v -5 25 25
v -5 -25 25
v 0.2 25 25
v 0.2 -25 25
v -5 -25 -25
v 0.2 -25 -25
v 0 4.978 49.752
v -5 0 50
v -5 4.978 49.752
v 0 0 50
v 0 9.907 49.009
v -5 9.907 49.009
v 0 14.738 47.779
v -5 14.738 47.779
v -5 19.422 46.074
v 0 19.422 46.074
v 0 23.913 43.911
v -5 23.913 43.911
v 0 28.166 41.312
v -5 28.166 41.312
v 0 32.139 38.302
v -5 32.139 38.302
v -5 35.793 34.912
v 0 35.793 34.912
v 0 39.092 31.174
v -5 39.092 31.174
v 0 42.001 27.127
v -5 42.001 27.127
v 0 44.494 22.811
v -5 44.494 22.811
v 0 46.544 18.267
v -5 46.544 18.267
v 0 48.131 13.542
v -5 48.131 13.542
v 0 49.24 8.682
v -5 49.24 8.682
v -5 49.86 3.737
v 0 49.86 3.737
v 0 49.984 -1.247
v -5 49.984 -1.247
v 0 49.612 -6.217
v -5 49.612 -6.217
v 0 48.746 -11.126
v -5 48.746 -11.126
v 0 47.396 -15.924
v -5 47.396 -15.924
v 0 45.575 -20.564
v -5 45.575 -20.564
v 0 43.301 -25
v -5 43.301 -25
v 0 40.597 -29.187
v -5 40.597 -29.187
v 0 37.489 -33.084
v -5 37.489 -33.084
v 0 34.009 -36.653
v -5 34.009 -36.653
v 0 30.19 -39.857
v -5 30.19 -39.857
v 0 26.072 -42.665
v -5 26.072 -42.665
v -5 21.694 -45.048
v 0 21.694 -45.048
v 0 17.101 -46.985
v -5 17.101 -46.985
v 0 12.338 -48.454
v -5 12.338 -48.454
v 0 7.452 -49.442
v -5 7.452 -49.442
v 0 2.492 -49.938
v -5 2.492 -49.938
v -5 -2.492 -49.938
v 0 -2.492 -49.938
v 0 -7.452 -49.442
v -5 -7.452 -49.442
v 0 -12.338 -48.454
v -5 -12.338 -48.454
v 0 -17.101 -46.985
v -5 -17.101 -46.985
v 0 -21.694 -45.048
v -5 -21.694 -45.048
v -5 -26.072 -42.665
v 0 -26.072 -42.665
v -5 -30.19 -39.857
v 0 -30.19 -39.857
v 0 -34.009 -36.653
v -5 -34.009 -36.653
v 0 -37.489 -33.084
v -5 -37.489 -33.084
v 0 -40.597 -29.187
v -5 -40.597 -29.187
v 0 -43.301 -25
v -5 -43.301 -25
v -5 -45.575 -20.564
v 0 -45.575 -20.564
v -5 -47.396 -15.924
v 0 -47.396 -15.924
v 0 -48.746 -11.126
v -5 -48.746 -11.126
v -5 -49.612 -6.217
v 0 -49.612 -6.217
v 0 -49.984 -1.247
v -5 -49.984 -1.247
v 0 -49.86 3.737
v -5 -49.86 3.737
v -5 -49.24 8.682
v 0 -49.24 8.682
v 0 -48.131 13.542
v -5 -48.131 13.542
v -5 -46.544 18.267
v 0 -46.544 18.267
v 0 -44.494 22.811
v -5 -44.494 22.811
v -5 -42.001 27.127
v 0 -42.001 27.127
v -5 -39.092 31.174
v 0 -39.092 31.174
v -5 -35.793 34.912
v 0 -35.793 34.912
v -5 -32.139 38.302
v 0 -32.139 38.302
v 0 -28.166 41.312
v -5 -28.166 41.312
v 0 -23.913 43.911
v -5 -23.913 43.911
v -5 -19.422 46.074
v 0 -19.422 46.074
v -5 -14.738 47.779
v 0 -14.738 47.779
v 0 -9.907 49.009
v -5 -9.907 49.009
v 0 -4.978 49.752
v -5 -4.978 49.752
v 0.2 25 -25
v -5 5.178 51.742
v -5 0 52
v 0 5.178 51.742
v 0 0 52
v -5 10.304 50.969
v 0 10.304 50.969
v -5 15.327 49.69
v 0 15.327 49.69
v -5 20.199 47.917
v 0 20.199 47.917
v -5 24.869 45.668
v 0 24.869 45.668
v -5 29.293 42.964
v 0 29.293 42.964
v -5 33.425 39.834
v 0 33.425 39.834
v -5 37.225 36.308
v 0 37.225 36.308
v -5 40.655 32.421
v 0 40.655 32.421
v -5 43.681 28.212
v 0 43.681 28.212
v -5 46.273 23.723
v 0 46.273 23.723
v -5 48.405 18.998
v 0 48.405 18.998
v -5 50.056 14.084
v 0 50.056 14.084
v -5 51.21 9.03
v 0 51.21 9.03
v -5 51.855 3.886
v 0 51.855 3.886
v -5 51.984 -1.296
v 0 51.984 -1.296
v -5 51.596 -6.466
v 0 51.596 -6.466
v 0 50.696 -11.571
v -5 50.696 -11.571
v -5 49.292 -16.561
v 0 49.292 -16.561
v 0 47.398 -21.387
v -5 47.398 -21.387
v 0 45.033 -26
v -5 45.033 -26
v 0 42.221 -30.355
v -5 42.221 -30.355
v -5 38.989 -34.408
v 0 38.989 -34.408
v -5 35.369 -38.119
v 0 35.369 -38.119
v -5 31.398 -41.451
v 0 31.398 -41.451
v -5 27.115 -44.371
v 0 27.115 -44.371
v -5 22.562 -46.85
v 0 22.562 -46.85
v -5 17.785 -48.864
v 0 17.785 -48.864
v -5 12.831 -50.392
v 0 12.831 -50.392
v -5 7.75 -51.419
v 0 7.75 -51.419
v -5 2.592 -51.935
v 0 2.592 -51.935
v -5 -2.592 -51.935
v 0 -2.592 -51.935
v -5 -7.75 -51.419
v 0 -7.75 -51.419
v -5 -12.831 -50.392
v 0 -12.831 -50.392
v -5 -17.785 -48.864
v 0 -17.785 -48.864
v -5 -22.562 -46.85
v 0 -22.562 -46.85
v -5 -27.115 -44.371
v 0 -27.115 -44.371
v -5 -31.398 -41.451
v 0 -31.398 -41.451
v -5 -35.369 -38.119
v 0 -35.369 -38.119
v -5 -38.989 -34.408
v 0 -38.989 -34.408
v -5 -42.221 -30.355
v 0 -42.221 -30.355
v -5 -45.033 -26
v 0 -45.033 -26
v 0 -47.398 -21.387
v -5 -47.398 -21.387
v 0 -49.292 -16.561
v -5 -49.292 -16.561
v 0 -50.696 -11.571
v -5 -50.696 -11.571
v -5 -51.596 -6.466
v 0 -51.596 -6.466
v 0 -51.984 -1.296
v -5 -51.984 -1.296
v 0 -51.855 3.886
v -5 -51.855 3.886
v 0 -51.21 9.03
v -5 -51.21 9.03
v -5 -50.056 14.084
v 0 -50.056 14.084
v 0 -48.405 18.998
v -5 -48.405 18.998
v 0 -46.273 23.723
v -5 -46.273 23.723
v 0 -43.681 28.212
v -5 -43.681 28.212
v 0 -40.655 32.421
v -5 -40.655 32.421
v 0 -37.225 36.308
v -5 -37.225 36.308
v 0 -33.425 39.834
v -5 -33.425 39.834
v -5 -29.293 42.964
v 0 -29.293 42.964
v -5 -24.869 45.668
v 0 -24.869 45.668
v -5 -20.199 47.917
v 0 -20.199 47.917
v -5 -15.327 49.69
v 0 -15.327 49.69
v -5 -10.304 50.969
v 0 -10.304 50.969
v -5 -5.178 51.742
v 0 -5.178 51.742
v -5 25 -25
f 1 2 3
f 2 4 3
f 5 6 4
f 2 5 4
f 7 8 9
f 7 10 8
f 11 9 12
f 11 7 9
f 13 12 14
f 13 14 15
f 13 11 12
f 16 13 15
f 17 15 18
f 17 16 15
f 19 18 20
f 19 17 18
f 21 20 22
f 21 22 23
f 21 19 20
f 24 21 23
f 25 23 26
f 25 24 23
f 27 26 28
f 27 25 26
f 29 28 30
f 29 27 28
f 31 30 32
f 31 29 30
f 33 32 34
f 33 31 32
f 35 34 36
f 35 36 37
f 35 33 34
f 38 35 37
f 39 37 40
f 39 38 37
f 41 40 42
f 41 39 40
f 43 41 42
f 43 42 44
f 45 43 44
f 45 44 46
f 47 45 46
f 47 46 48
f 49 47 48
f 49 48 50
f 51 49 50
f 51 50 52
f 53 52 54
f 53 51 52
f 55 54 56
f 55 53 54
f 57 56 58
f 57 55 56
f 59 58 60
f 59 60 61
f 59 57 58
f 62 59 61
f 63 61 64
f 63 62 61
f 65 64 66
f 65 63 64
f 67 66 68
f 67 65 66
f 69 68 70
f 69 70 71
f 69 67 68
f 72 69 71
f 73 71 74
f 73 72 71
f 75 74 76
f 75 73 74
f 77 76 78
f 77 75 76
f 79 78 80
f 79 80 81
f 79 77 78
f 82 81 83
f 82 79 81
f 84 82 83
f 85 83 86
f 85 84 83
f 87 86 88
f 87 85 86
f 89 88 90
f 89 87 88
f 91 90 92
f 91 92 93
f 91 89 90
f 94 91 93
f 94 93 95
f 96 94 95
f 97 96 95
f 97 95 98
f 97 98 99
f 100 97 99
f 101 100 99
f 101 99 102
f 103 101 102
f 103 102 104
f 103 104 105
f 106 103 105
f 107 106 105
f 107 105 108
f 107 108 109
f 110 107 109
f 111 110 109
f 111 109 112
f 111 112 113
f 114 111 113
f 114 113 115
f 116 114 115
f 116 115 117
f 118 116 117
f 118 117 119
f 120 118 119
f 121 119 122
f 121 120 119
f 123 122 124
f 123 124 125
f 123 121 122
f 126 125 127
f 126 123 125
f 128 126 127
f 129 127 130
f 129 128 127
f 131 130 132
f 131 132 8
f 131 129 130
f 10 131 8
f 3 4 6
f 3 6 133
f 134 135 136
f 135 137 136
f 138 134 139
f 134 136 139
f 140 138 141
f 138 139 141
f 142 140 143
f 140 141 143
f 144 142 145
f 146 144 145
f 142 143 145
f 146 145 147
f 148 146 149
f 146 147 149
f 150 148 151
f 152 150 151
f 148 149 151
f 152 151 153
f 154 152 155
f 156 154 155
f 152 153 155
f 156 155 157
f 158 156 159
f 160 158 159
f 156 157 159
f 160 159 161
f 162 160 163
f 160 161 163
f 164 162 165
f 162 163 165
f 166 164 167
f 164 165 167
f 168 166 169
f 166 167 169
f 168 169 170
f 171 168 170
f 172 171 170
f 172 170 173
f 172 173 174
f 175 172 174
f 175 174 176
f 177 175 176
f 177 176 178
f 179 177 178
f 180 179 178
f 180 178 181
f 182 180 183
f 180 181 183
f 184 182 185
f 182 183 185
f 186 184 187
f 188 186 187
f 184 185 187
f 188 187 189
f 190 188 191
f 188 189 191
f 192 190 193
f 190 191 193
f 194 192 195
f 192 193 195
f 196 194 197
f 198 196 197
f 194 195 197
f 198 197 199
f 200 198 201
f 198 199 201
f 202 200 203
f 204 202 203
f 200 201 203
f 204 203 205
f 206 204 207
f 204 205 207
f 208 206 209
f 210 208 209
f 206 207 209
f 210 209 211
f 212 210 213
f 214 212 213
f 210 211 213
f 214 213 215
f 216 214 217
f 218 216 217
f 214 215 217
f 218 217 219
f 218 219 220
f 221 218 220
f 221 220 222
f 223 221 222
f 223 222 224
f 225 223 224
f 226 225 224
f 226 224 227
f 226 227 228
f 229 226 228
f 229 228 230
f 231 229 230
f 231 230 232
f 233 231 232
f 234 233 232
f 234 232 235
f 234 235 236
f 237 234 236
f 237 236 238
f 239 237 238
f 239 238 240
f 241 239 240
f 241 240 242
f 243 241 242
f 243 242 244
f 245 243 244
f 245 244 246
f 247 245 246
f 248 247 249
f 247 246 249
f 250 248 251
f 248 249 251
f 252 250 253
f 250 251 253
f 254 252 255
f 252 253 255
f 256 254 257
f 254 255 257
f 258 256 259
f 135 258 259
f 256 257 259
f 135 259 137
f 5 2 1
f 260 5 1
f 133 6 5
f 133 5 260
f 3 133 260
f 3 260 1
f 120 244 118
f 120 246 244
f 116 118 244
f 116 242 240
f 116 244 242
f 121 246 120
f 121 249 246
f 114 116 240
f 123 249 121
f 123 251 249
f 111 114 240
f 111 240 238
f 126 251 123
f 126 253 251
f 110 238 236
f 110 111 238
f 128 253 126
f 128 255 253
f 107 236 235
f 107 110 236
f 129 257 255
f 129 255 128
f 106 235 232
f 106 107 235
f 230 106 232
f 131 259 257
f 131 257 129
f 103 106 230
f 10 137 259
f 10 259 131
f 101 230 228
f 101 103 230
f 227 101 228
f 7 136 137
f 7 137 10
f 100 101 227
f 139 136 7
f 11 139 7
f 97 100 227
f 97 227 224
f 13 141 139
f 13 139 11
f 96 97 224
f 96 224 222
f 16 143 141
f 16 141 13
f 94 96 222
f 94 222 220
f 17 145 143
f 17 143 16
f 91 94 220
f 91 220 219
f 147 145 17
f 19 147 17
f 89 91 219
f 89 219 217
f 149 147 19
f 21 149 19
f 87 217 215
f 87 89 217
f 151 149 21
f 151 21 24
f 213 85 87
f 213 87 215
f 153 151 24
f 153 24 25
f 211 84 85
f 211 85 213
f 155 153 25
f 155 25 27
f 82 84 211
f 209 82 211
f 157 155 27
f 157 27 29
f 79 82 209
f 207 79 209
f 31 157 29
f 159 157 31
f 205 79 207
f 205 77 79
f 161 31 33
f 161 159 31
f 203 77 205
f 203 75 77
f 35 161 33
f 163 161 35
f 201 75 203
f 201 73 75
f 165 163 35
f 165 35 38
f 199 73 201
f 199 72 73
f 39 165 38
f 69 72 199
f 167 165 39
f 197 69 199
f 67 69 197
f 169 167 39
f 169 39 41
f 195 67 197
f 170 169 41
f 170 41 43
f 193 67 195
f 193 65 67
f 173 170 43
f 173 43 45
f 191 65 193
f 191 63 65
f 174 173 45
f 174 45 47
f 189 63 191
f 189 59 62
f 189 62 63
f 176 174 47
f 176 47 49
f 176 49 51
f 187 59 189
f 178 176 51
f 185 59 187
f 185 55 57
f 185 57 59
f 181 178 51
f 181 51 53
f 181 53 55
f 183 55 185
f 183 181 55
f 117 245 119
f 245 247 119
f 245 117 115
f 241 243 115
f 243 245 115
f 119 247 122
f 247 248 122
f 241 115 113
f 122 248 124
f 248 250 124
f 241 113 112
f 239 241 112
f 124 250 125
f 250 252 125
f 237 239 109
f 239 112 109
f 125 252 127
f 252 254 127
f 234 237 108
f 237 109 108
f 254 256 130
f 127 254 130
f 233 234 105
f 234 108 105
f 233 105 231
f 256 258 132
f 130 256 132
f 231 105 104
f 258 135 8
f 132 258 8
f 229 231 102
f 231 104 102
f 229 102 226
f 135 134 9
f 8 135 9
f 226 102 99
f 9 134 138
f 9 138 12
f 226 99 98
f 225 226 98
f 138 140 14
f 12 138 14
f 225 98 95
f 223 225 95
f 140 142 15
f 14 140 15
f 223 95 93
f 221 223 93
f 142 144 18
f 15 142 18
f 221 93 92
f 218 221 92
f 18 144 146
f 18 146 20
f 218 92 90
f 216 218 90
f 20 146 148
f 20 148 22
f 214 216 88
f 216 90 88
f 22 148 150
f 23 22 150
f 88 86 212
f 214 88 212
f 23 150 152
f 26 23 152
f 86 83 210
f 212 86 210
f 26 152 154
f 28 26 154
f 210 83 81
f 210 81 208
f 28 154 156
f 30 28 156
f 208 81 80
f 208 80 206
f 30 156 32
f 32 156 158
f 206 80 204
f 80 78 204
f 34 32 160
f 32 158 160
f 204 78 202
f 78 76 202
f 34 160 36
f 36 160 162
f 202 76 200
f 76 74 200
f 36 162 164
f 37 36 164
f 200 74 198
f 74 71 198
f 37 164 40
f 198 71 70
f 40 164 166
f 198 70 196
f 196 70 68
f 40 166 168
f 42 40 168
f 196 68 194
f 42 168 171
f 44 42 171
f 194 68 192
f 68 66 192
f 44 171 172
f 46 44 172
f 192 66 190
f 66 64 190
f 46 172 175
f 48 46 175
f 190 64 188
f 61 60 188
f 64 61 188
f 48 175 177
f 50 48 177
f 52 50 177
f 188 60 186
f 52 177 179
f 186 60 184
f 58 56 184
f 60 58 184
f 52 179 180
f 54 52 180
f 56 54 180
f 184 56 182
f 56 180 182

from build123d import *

# Parameters (mm, degrees)
F0_W          = 5
F0_H          = 2
F2_W          = 50.000001
F2_H          = 50
F3_DEPTH      = 0.2
F3_DEPTH_BACK = 5


with BuildPart() as f1:
    # F0 (on Front) → F1 (revolve)
    with BuildSketch(Plane.XZ):
        with Locations((-2.5, 51)):
            Rectangle(F0_W, F0_H)
    revolve(axis=Axis((-39.879699, 0, 0), (-1, 0, 0)))


with BuildPart() as f3:
    # F2 (on Right) → F3 (new body, two sides)
    with BuildSketch(Plane.YZ) as f3_sk:
        with Locations((0, 0)):
            Rectangle(F2_W, F2_H)
    extrude(amount=F3_DEPTH)
    extrude(f3_sk.sketch, amount=-F3_DEPTH_BACK)


solid = Compound([f1.part, f3.part])
